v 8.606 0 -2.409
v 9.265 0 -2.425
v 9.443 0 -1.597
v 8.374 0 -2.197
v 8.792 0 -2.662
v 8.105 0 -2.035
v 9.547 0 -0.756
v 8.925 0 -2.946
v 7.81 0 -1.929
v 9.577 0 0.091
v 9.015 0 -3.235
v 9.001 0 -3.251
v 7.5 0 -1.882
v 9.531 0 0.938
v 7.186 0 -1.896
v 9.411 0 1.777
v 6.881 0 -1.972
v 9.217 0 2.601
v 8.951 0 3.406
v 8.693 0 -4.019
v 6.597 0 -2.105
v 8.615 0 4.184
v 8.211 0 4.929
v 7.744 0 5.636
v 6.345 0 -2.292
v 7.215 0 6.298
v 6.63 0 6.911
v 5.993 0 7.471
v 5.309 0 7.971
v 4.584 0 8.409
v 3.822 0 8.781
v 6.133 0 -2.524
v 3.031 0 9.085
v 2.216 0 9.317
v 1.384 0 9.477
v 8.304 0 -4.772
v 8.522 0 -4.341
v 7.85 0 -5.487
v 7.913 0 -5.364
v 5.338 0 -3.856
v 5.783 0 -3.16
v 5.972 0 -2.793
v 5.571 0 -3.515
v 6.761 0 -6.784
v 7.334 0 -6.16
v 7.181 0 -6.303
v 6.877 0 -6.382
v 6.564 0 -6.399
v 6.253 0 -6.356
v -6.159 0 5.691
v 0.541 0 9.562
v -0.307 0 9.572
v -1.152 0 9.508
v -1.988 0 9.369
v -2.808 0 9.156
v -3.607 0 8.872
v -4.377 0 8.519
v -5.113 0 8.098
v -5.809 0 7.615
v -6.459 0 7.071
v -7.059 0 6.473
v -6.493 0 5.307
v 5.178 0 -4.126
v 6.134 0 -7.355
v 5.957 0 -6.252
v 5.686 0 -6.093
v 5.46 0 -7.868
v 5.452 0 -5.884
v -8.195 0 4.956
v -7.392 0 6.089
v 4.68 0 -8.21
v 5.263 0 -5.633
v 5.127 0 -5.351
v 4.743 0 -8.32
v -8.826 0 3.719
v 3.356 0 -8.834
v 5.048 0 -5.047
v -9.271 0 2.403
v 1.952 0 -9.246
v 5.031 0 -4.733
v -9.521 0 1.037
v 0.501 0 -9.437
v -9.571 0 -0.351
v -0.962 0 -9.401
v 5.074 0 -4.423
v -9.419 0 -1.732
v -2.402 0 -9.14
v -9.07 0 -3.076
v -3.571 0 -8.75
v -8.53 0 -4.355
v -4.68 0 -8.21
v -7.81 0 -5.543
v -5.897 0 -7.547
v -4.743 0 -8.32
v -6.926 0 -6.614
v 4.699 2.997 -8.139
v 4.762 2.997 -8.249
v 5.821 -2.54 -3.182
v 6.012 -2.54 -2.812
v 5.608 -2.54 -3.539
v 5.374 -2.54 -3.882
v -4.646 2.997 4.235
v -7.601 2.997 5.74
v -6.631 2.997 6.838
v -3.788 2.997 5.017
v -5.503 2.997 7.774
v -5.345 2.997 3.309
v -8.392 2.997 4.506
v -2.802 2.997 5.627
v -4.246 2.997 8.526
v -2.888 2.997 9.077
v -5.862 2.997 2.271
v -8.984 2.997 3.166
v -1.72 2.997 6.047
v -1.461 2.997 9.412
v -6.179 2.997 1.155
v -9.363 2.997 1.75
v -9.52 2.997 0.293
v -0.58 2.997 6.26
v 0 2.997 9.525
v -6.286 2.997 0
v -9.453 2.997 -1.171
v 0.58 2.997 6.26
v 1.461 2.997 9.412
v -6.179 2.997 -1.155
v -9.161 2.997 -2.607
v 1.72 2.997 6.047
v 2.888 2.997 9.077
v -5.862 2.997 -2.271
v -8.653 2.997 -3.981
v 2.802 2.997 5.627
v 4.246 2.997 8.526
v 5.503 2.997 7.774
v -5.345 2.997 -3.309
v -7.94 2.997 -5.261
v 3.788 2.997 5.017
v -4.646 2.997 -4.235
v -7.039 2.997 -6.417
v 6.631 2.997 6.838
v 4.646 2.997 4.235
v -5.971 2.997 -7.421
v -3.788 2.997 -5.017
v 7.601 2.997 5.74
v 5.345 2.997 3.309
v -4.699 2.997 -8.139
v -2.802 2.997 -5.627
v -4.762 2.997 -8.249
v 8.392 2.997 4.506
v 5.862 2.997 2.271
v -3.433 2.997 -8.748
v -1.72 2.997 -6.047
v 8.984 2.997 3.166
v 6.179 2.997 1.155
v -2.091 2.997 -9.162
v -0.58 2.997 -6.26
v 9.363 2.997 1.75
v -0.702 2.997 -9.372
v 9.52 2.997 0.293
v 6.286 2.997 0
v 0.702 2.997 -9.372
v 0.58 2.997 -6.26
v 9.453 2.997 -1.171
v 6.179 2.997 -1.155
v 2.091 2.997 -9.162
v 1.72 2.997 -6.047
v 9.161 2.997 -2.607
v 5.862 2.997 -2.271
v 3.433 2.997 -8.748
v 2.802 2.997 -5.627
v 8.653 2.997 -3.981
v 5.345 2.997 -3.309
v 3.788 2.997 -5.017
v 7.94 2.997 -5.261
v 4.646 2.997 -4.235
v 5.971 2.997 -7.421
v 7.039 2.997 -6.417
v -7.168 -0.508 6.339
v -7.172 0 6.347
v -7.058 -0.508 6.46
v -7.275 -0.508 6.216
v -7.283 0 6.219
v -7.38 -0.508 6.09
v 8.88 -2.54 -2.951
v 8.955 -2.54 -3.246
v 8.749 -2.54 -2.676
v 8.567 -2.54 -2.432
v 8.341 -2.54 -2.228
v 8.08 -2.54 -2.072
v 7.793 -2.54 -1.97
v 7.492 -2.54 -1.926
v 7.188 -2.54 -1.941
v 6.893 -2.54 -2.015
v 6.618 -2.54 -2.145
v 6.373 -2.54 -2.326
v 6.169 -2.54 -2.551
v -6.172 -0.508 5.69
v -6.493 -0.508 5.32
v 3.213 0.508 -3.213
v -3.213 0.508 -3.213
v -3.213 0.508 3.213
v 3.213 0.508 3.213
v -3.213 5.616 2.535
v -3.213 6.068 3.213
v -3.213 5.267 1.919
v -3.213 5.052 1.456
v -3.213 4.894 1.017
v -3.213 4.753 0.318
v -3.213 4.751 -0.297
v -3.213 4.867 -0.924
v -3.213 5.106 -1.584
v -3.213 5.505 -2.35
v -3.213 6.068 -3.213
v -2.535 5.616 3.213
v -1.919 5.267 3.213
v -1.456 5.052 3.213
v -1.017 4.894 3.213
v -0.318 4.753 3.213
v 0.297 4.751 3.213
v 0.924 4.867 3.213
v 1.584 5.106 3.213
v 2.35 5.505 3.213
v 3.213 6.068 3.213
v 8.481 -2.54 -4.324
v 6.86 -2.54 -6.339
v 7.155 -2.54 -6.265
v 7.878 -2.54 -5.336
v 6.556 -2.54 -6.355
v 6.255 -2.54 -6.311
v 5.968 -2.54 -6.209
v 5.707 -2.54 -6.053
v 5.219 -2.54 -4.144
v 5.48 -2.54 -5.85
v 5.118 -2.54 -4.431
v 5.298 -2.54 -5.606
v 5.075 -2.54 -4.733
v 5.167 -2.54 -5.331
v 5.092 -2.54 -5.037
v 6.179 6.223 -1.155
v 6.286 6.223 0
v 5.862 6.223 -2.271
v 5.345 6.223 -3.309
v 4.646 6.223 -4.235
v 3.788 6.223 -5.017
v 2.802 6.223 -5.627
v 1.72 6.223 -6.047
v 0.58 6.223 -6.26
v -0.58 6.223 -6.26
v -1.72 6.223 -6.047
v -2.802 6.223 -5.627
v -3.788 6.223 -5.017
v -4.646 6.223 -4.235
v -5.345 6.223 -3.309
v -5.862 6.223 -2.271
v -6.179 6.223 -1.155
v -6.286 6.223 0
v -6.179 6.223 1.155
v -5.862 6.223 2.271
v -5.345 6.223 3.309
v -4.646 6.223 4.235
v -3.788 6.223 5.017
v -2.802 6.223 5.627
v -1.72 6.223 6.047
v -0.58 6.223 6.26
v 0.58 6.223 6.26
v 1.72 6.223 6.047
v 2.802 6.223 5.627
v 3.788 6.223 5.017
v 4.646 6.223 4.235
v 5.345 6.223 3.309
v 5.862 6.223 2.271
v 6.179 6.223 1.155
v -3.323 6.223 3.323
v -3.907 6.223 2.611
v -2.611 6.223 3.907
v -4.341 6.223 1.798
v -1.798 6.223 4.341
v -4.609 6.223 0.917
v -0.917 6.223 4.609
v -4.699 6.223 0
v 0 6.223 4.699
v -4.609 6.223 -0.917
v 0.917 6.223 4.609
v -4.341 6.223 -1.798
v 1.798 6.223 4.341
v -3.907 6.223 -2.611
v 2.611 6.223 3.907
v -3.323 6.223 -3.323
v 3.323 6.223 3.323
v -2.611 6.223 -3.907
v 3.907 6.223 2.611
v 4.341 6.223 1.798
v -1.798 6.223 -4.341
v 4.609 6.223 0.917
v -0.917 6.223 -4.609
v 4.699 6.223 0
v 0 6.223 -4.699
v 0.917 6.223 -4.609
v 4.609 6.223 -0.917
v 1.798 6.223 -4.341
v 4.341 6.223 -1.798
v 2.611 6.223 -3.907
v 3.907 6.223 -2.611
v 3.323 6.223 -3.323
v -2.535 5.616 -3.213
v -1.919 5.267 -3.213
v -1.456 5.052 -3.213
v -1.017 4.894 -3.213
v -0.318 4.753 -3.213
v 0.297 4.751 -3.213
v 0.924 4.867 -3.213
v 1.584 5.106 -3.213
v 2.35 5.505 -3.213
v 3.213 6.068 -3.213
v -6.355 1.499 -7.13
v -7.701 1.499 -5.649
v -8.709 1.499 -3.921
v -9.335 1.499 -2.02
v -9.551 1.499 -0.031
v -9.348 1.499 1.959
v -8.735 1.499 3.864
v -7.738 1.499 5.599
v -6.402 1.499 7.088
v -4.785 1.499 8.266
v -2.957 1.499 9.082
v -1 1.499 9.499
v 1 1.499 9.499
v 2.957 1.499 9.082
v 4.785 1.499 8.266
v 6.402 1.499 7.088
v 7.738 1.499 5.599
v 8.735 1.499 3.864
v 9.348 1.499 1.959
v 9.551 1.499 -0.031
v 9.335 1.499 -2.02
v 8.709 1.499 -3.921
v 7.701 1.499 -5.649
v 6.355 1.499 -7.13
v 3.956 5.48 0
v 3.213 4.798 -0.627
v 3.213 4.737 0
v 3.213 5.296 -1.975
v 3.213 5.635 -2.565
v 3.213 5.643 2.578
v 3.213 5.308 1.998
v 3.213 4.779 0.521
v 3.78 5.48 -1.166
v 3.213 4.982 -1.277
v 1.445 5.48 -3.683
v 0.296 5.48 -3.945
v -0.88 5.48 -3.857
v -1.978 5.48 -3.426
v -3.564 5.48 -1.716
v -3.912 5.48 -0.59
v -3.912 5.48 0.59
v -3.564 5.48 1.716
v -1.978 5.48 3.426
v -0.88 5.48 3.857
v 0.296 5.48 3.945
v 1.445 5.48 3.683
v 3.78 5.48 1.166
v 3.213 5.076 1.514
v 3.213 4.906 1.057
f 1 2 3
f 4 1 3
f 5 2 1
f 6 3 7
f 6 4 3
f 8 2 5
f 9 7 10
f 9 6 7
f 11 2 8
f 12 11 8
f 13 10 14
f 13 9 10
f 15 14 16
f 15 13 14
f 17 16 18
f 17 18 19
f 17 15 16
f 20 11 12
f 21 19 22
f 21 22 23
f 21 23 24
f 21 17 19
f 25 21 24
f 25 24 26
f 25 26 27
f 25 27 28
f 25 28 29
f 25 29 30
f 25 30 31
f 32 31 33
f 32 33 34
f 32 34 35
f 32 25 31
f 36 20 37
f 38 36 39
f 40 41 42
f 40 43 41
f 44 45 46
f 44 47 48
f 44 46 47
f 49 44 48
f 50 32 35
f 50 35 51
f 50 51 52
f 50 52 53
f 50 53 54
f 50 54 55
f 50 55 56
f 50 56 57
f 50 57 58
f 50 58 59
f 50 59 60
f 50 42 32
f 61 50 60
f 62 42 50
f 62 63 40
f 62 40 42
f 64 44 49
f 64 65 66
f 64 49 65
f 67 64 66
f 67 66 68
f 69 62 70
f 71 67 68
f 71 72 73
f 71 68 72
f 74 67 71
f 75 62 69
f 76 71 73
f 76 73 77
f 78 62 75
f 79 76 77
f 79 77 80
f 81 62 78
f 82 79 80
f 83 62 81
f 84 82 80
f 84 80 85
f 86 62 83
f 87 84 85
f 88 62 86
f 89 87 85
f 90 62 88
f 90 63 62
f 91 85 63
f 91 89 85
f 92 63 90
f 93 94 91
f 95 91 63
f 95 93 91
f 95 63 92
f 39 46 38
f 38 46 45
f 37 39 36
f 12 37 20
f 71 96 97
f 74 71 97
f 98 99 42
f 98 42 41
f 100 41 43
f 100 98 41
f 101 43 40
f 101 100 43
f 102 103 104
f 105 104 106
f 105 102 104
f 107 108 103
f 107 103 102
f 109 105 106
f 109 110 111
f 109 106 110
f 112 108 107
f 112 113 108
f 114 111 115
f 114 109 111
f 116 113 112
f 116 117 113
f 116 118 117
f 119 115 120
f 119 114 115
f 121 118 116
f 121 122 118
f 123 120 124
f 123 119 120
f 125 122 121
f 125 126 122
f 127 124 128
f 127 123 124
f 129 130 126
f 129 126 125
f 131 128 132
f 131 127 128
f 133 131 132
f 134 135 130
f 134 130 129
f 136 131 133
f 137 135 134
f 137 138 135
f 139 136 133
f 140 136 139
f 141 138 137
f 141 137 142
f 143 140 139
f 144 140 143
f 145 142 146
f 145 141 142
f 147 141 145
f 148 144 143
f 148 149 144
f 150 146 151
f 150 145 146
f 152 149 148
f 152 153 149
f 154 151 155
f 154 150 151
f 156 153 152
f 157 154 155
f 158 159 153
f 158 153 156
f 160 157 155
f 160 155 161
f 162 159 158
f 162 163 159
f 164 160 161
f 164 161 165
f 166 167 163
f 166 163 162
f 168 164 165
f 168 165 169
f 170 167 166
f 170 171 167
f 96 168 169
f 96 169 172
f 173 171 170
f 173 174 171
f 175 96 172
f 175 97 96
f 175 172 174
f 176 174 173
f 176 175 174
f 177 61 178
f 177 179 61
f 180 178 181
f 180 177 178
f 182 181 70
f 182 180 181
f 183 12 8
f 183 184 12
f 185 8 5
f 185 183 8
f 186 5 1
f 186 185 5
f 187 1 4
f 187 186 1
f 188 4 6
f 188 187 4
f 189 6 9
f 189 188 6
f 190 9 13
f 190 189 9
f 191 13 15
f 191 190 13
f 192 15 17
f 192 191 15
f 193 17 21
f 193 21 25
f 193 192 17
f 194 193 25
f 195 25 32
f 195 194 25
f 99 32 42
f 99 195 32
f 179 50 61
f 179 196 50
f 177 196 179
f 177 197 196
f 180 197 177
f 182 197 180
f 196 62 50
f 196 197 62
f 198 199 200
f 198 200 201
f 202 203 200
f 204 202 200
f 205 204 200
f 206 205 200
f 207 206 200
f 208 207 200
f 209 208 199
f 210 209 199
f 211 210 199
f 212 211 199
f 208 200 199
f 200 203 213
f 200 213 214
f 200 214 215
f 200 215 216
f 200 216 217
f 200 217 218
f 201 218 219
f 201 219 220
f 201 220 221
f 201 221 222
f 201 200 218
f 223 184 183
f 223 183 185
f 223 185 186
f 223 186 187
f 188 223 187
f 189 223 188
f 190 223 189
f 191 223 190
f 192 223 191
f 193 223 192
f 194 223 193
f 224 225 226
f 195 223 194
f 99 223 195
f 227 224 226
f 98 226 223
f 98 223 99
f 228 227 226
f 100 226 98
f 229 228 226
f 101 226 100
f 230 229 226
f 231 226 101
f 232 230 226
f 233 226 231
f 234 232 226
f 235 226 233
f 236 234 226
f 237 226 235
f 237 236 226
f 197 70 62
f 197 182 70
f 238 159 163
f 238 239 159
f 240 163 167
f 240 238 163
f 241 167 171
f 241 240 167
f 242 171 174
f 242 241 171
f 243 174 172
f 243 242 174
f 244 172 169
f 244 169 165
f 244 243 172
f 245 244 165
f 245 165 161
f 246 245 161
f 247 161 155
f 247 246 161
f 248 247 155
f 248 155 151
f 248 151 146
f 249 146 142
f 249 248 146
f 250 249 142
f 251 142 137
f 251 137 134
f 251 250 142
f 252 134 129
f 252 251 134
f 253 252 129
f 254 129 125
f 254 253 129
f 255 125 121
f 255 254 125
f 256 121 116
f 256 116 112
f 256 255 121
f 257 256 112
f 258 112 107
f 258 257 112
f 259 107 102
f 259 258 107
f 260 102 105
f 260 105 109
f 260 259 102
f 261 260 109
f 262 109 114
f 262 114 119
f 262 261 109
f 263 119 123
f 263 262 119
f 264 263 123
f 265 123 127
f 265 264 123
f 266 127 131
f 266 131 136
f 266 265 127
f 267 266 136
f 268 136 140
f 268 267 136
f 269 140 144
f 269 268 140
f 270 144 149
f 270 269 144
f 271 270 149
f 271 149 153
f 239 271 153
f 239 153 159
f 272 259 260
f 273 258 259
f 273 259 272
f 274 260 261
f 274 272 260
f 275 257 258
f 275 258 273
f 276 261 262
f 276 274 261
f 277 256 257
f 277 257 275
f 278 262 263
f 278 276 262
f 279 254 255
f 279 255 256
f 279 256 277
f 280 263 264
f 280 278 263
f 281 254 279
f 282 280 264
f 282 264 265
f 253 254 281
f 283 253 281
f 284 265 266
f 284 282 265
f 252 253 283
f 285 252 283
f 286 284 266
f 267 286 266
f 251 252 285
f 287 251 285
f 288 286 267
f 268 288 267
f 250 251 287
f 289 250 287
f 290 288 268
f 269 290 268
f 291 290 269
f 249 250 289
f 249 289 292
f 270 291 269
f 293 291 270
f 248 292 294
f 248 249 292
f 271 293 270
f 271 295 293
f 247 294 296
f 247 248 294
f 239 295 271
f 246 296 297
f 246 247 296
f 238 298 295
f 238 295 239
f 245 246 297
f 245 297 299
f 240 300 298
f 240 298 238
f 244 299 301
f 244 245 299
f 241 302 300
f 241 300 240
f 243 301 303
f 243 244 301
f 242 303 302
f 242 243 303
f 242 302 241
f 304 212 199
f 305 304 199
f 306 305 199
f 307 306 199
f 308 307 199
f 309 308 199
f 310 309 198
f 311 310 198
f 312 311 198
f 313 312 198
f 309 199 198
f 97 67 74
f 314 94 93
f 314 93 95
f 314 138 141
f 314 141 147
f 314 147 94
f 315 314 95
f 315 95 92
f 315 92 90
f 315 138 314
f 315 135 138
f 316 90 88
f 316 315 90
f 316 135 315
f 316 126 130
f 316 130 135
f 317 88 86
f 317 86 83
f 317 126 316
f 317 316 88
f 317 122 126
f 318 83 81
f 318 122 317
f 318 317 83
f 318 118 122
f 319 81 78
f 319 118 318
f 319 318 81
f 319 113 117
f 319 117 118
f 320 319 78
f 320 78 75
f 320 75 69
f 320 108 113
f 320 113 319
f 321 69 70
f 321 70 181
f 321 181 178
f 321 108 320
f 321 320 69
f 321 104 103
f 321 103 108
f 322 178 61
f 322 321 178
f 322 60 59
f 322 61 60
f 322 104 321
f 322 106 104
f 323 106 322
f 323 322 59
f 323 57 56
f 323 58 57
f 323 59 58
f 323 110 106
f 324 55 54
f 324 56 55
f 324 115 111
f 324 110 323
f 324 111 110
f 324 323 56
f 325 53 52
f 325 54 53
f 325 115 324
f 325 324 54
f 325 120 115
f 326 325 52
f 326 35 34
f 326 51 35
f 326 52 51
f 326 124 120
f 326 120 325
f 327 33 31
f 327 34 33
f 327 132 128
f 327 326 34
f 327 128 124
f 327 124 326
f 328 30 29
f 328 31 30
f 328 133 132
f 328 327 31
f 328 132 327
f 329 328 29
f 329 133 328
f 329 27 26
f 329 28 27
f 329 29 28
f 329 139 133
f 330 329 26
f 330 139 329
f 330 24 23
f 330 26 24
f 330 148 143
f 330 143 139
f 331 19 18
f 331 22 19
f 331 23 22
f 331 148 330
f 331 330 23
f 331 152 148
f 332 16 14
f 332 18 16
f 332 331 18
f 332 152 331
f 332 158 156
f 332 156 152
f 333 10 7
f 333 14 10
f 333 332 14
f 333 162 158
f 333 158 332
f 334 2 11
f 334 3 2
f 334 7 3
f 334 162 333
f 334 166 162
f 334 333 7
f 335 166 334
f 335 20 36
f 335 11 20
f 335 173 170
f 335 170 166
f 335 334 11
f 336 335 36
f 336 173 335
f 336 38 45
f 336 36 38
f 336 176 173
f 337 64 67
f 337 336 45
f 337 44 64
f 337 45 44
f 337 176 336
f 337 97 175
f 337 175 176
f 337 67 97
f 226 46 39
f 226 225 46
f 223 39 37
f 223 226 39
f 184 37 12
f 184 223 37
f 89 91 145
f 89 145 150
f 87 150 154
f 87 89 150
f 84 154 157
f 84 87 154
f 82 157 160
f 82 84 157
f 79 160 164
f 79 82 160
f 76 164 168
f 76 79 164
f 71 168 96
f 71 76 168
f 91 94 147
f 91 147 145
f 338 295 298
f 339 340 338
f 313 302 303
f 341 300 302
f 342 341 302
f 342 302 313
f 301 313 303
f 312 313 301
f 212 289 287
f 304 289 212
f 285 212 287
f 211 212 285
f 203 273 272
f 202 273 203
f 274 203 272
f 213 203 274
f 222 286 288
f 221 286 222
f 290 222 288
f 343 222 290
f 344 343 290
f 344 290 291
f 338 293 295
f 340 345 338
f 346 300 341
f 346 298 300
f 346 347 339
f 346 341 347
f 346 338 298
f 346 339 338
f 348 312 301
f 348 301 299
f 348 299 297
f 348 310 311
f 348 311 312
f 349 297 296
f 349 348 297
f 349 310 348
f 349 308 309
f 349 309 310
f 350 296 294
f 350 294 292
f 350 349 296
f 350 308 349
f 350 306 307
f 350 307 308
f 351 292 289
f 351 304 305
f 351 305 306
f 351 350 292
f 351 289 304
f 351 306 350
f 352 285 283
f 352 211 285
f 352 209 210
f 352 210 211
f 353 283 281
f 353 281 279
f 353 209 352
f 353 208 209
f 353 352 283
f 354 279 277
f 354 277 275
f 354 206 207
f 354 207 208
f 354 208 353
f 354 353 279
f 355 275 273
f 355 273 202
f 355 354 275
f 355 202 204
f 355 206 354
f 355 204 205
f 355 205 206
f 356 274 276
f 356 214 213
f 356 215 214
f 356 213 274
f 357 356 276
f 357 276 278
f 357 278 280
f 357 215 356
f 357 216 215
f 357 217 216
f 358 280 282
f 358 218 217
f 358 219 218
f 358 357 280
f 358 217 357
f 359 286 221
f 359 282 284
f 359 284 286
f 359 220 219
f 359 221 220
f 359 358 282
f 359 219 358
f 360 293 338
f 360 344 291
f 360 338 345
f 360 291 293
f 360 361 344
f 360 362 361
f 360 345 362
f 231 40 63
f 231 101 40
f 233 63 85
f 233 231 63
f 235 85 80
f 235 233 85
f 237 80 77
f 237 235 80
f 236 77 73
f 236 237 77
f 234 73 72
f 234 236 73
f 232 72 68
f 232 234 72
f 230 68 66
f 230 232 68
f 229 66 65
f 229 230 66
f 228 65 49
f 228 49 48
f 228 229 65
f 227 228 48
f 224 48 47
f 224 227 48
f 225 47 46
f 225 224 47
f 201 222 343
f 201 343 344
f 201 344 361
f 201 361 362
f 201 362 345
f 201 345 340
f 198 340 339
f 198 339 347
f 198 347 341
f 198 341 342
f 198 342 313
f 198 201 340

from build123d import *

# Parameters (mm, degrees)
SKETCH2_W           = 6.4262
SKETCH2_H           = 6.4262
CUT_EXTRUDE1_DEPTH  = 6.715
DRAFT1_ANGLE        = 1
BOSS_EXTRUDE2_DEPTH = 2.54
BOSS_EXTRUDE2_TAPER = 1
BOSS_EXTRUDE3_DEPTH = 0.508
BOSS_EXTRUDE3_TAPER = 1
CUT_EXTRUDE2_DEPTH  = 6.5372
CUT_EXTRUDE2_TAPER  = 1


with BuildPart() as part:
    # Sketch1 → Revolve1 (revolve)
    with BuildSketch(Plane.XY):
        Polygon((0, 0), (9.525, 0), (9.525, 2.9972), (6.2865, 2.9972), (6.2865, 6.223), (0, 6.223), align=None)
    revolve(axis=Axis((0, -4.12115, 0), (0, 1, 0)))

    # Sketch2 → Cut-Extrude1 (cut, through all)
    with BuildSketch(Plane(origin=(0, 0.508, 0), x_dir=(1, 0, 0), z_dir=(0, 1, 0))):
        Rectangle(SKETCH2_W, SKETCH2_H)
    extrude(amount=CUT_EXTRUDE1_DEPTH, mode=Mode.SUBTRACT)

    # Sketch3 → Cut-Revolve1 (revolve, cut)
    with BuildSketch(Plane.XY):
        Polygon((0, 6.223), (4.699, 6.223), (0, 1.524), align=None)
    revolve(axis=Axis((0, 0, 0), (0, 1, 0)), mode=Mode.SUBTRACT)

    # Draft1
    draft1_faces = [part.faces().sort_by_distance(p)[0] for p in [
        (-9.525, 1.4986, 0),
    ]]
    draft(draft1_faces, Plane(origin=(9.525, 2.9972, 0), x_dir=(0, 0, 1), z_dir=(0, 1, 0)), DRAFT1_ANGLE)

    # Sketch4 → Boss-Extrude2 (add)
    with BuildSketch(Plane.XZ):
        with BuildLine():
            ThreePointArc((5.337752, -3.855992), (5.351306, -5.763469), (7.181023, -6.302716))
            ThreePointArc((7.181023, -6.302716), (8.233547, -4.861812), (9.000511, -3.250672))
            ThreePointArc((9.000511, -3.250672), (7.655973, -1.897575), (5.971572, -2.792809))
            ThreePointArc((5.971572, -2.792809), (5.679626, -3.339283), (5.337752, -3.855992))
        make_face()
    extrude(amount=BOSS_EXTRUDE2_DEPTH, taper=BOSS_EXTRUDE2_TAPER)

    # Sketch5 → Boss-Extrude3 (add)
    with BuildSketch(Plane.XZ):
        with BuildLine():
            Line((-6.159337, 5.690783), (-7.058911, 6.472771))
            ThreePointArc((-7.058911, 6.472771), (-7.228092, 6.283285), (-7.392189, 6.089379))
            Line((-7.392189, 6.089379), (-6.492615, 5.307391))
            Line((-6.492615, 5.307391), (-6.159337, 5.690783))
        make_face()
    extrude(amount=BOSS_EXTRUDE3_DEPTH, taper=BOSS_EXTRUDE3_TAPER)

    # Sketch6 → Cut-Extrude2 (cut, through all)
    with BuildSketch(Plane(origin=(0, 2.9972, 0), x_dir=(1, 0, 0), z_dir=(0, 1, 0))):
        with BuildLine():
            Line((-5.08, 8.798818), (-4.699, 8.138907))
            ThreePointArc((-4.699, 8.138907), (0, 9.398), (4.699, 8.138907))
            Line((4.699, 8.138907), (5.08, 8.798818))
            ThreePointArc((5.08, 8.798818), (0, 10.16), (-5.08, 8.798818))
        make_face()
    extrude(amount=-CUT_EXTRUDE2_DEPTH, taper=CUT_EXTRUDE2_TAPER, mode=Mode.SUBTRACT)


solid = part.part
